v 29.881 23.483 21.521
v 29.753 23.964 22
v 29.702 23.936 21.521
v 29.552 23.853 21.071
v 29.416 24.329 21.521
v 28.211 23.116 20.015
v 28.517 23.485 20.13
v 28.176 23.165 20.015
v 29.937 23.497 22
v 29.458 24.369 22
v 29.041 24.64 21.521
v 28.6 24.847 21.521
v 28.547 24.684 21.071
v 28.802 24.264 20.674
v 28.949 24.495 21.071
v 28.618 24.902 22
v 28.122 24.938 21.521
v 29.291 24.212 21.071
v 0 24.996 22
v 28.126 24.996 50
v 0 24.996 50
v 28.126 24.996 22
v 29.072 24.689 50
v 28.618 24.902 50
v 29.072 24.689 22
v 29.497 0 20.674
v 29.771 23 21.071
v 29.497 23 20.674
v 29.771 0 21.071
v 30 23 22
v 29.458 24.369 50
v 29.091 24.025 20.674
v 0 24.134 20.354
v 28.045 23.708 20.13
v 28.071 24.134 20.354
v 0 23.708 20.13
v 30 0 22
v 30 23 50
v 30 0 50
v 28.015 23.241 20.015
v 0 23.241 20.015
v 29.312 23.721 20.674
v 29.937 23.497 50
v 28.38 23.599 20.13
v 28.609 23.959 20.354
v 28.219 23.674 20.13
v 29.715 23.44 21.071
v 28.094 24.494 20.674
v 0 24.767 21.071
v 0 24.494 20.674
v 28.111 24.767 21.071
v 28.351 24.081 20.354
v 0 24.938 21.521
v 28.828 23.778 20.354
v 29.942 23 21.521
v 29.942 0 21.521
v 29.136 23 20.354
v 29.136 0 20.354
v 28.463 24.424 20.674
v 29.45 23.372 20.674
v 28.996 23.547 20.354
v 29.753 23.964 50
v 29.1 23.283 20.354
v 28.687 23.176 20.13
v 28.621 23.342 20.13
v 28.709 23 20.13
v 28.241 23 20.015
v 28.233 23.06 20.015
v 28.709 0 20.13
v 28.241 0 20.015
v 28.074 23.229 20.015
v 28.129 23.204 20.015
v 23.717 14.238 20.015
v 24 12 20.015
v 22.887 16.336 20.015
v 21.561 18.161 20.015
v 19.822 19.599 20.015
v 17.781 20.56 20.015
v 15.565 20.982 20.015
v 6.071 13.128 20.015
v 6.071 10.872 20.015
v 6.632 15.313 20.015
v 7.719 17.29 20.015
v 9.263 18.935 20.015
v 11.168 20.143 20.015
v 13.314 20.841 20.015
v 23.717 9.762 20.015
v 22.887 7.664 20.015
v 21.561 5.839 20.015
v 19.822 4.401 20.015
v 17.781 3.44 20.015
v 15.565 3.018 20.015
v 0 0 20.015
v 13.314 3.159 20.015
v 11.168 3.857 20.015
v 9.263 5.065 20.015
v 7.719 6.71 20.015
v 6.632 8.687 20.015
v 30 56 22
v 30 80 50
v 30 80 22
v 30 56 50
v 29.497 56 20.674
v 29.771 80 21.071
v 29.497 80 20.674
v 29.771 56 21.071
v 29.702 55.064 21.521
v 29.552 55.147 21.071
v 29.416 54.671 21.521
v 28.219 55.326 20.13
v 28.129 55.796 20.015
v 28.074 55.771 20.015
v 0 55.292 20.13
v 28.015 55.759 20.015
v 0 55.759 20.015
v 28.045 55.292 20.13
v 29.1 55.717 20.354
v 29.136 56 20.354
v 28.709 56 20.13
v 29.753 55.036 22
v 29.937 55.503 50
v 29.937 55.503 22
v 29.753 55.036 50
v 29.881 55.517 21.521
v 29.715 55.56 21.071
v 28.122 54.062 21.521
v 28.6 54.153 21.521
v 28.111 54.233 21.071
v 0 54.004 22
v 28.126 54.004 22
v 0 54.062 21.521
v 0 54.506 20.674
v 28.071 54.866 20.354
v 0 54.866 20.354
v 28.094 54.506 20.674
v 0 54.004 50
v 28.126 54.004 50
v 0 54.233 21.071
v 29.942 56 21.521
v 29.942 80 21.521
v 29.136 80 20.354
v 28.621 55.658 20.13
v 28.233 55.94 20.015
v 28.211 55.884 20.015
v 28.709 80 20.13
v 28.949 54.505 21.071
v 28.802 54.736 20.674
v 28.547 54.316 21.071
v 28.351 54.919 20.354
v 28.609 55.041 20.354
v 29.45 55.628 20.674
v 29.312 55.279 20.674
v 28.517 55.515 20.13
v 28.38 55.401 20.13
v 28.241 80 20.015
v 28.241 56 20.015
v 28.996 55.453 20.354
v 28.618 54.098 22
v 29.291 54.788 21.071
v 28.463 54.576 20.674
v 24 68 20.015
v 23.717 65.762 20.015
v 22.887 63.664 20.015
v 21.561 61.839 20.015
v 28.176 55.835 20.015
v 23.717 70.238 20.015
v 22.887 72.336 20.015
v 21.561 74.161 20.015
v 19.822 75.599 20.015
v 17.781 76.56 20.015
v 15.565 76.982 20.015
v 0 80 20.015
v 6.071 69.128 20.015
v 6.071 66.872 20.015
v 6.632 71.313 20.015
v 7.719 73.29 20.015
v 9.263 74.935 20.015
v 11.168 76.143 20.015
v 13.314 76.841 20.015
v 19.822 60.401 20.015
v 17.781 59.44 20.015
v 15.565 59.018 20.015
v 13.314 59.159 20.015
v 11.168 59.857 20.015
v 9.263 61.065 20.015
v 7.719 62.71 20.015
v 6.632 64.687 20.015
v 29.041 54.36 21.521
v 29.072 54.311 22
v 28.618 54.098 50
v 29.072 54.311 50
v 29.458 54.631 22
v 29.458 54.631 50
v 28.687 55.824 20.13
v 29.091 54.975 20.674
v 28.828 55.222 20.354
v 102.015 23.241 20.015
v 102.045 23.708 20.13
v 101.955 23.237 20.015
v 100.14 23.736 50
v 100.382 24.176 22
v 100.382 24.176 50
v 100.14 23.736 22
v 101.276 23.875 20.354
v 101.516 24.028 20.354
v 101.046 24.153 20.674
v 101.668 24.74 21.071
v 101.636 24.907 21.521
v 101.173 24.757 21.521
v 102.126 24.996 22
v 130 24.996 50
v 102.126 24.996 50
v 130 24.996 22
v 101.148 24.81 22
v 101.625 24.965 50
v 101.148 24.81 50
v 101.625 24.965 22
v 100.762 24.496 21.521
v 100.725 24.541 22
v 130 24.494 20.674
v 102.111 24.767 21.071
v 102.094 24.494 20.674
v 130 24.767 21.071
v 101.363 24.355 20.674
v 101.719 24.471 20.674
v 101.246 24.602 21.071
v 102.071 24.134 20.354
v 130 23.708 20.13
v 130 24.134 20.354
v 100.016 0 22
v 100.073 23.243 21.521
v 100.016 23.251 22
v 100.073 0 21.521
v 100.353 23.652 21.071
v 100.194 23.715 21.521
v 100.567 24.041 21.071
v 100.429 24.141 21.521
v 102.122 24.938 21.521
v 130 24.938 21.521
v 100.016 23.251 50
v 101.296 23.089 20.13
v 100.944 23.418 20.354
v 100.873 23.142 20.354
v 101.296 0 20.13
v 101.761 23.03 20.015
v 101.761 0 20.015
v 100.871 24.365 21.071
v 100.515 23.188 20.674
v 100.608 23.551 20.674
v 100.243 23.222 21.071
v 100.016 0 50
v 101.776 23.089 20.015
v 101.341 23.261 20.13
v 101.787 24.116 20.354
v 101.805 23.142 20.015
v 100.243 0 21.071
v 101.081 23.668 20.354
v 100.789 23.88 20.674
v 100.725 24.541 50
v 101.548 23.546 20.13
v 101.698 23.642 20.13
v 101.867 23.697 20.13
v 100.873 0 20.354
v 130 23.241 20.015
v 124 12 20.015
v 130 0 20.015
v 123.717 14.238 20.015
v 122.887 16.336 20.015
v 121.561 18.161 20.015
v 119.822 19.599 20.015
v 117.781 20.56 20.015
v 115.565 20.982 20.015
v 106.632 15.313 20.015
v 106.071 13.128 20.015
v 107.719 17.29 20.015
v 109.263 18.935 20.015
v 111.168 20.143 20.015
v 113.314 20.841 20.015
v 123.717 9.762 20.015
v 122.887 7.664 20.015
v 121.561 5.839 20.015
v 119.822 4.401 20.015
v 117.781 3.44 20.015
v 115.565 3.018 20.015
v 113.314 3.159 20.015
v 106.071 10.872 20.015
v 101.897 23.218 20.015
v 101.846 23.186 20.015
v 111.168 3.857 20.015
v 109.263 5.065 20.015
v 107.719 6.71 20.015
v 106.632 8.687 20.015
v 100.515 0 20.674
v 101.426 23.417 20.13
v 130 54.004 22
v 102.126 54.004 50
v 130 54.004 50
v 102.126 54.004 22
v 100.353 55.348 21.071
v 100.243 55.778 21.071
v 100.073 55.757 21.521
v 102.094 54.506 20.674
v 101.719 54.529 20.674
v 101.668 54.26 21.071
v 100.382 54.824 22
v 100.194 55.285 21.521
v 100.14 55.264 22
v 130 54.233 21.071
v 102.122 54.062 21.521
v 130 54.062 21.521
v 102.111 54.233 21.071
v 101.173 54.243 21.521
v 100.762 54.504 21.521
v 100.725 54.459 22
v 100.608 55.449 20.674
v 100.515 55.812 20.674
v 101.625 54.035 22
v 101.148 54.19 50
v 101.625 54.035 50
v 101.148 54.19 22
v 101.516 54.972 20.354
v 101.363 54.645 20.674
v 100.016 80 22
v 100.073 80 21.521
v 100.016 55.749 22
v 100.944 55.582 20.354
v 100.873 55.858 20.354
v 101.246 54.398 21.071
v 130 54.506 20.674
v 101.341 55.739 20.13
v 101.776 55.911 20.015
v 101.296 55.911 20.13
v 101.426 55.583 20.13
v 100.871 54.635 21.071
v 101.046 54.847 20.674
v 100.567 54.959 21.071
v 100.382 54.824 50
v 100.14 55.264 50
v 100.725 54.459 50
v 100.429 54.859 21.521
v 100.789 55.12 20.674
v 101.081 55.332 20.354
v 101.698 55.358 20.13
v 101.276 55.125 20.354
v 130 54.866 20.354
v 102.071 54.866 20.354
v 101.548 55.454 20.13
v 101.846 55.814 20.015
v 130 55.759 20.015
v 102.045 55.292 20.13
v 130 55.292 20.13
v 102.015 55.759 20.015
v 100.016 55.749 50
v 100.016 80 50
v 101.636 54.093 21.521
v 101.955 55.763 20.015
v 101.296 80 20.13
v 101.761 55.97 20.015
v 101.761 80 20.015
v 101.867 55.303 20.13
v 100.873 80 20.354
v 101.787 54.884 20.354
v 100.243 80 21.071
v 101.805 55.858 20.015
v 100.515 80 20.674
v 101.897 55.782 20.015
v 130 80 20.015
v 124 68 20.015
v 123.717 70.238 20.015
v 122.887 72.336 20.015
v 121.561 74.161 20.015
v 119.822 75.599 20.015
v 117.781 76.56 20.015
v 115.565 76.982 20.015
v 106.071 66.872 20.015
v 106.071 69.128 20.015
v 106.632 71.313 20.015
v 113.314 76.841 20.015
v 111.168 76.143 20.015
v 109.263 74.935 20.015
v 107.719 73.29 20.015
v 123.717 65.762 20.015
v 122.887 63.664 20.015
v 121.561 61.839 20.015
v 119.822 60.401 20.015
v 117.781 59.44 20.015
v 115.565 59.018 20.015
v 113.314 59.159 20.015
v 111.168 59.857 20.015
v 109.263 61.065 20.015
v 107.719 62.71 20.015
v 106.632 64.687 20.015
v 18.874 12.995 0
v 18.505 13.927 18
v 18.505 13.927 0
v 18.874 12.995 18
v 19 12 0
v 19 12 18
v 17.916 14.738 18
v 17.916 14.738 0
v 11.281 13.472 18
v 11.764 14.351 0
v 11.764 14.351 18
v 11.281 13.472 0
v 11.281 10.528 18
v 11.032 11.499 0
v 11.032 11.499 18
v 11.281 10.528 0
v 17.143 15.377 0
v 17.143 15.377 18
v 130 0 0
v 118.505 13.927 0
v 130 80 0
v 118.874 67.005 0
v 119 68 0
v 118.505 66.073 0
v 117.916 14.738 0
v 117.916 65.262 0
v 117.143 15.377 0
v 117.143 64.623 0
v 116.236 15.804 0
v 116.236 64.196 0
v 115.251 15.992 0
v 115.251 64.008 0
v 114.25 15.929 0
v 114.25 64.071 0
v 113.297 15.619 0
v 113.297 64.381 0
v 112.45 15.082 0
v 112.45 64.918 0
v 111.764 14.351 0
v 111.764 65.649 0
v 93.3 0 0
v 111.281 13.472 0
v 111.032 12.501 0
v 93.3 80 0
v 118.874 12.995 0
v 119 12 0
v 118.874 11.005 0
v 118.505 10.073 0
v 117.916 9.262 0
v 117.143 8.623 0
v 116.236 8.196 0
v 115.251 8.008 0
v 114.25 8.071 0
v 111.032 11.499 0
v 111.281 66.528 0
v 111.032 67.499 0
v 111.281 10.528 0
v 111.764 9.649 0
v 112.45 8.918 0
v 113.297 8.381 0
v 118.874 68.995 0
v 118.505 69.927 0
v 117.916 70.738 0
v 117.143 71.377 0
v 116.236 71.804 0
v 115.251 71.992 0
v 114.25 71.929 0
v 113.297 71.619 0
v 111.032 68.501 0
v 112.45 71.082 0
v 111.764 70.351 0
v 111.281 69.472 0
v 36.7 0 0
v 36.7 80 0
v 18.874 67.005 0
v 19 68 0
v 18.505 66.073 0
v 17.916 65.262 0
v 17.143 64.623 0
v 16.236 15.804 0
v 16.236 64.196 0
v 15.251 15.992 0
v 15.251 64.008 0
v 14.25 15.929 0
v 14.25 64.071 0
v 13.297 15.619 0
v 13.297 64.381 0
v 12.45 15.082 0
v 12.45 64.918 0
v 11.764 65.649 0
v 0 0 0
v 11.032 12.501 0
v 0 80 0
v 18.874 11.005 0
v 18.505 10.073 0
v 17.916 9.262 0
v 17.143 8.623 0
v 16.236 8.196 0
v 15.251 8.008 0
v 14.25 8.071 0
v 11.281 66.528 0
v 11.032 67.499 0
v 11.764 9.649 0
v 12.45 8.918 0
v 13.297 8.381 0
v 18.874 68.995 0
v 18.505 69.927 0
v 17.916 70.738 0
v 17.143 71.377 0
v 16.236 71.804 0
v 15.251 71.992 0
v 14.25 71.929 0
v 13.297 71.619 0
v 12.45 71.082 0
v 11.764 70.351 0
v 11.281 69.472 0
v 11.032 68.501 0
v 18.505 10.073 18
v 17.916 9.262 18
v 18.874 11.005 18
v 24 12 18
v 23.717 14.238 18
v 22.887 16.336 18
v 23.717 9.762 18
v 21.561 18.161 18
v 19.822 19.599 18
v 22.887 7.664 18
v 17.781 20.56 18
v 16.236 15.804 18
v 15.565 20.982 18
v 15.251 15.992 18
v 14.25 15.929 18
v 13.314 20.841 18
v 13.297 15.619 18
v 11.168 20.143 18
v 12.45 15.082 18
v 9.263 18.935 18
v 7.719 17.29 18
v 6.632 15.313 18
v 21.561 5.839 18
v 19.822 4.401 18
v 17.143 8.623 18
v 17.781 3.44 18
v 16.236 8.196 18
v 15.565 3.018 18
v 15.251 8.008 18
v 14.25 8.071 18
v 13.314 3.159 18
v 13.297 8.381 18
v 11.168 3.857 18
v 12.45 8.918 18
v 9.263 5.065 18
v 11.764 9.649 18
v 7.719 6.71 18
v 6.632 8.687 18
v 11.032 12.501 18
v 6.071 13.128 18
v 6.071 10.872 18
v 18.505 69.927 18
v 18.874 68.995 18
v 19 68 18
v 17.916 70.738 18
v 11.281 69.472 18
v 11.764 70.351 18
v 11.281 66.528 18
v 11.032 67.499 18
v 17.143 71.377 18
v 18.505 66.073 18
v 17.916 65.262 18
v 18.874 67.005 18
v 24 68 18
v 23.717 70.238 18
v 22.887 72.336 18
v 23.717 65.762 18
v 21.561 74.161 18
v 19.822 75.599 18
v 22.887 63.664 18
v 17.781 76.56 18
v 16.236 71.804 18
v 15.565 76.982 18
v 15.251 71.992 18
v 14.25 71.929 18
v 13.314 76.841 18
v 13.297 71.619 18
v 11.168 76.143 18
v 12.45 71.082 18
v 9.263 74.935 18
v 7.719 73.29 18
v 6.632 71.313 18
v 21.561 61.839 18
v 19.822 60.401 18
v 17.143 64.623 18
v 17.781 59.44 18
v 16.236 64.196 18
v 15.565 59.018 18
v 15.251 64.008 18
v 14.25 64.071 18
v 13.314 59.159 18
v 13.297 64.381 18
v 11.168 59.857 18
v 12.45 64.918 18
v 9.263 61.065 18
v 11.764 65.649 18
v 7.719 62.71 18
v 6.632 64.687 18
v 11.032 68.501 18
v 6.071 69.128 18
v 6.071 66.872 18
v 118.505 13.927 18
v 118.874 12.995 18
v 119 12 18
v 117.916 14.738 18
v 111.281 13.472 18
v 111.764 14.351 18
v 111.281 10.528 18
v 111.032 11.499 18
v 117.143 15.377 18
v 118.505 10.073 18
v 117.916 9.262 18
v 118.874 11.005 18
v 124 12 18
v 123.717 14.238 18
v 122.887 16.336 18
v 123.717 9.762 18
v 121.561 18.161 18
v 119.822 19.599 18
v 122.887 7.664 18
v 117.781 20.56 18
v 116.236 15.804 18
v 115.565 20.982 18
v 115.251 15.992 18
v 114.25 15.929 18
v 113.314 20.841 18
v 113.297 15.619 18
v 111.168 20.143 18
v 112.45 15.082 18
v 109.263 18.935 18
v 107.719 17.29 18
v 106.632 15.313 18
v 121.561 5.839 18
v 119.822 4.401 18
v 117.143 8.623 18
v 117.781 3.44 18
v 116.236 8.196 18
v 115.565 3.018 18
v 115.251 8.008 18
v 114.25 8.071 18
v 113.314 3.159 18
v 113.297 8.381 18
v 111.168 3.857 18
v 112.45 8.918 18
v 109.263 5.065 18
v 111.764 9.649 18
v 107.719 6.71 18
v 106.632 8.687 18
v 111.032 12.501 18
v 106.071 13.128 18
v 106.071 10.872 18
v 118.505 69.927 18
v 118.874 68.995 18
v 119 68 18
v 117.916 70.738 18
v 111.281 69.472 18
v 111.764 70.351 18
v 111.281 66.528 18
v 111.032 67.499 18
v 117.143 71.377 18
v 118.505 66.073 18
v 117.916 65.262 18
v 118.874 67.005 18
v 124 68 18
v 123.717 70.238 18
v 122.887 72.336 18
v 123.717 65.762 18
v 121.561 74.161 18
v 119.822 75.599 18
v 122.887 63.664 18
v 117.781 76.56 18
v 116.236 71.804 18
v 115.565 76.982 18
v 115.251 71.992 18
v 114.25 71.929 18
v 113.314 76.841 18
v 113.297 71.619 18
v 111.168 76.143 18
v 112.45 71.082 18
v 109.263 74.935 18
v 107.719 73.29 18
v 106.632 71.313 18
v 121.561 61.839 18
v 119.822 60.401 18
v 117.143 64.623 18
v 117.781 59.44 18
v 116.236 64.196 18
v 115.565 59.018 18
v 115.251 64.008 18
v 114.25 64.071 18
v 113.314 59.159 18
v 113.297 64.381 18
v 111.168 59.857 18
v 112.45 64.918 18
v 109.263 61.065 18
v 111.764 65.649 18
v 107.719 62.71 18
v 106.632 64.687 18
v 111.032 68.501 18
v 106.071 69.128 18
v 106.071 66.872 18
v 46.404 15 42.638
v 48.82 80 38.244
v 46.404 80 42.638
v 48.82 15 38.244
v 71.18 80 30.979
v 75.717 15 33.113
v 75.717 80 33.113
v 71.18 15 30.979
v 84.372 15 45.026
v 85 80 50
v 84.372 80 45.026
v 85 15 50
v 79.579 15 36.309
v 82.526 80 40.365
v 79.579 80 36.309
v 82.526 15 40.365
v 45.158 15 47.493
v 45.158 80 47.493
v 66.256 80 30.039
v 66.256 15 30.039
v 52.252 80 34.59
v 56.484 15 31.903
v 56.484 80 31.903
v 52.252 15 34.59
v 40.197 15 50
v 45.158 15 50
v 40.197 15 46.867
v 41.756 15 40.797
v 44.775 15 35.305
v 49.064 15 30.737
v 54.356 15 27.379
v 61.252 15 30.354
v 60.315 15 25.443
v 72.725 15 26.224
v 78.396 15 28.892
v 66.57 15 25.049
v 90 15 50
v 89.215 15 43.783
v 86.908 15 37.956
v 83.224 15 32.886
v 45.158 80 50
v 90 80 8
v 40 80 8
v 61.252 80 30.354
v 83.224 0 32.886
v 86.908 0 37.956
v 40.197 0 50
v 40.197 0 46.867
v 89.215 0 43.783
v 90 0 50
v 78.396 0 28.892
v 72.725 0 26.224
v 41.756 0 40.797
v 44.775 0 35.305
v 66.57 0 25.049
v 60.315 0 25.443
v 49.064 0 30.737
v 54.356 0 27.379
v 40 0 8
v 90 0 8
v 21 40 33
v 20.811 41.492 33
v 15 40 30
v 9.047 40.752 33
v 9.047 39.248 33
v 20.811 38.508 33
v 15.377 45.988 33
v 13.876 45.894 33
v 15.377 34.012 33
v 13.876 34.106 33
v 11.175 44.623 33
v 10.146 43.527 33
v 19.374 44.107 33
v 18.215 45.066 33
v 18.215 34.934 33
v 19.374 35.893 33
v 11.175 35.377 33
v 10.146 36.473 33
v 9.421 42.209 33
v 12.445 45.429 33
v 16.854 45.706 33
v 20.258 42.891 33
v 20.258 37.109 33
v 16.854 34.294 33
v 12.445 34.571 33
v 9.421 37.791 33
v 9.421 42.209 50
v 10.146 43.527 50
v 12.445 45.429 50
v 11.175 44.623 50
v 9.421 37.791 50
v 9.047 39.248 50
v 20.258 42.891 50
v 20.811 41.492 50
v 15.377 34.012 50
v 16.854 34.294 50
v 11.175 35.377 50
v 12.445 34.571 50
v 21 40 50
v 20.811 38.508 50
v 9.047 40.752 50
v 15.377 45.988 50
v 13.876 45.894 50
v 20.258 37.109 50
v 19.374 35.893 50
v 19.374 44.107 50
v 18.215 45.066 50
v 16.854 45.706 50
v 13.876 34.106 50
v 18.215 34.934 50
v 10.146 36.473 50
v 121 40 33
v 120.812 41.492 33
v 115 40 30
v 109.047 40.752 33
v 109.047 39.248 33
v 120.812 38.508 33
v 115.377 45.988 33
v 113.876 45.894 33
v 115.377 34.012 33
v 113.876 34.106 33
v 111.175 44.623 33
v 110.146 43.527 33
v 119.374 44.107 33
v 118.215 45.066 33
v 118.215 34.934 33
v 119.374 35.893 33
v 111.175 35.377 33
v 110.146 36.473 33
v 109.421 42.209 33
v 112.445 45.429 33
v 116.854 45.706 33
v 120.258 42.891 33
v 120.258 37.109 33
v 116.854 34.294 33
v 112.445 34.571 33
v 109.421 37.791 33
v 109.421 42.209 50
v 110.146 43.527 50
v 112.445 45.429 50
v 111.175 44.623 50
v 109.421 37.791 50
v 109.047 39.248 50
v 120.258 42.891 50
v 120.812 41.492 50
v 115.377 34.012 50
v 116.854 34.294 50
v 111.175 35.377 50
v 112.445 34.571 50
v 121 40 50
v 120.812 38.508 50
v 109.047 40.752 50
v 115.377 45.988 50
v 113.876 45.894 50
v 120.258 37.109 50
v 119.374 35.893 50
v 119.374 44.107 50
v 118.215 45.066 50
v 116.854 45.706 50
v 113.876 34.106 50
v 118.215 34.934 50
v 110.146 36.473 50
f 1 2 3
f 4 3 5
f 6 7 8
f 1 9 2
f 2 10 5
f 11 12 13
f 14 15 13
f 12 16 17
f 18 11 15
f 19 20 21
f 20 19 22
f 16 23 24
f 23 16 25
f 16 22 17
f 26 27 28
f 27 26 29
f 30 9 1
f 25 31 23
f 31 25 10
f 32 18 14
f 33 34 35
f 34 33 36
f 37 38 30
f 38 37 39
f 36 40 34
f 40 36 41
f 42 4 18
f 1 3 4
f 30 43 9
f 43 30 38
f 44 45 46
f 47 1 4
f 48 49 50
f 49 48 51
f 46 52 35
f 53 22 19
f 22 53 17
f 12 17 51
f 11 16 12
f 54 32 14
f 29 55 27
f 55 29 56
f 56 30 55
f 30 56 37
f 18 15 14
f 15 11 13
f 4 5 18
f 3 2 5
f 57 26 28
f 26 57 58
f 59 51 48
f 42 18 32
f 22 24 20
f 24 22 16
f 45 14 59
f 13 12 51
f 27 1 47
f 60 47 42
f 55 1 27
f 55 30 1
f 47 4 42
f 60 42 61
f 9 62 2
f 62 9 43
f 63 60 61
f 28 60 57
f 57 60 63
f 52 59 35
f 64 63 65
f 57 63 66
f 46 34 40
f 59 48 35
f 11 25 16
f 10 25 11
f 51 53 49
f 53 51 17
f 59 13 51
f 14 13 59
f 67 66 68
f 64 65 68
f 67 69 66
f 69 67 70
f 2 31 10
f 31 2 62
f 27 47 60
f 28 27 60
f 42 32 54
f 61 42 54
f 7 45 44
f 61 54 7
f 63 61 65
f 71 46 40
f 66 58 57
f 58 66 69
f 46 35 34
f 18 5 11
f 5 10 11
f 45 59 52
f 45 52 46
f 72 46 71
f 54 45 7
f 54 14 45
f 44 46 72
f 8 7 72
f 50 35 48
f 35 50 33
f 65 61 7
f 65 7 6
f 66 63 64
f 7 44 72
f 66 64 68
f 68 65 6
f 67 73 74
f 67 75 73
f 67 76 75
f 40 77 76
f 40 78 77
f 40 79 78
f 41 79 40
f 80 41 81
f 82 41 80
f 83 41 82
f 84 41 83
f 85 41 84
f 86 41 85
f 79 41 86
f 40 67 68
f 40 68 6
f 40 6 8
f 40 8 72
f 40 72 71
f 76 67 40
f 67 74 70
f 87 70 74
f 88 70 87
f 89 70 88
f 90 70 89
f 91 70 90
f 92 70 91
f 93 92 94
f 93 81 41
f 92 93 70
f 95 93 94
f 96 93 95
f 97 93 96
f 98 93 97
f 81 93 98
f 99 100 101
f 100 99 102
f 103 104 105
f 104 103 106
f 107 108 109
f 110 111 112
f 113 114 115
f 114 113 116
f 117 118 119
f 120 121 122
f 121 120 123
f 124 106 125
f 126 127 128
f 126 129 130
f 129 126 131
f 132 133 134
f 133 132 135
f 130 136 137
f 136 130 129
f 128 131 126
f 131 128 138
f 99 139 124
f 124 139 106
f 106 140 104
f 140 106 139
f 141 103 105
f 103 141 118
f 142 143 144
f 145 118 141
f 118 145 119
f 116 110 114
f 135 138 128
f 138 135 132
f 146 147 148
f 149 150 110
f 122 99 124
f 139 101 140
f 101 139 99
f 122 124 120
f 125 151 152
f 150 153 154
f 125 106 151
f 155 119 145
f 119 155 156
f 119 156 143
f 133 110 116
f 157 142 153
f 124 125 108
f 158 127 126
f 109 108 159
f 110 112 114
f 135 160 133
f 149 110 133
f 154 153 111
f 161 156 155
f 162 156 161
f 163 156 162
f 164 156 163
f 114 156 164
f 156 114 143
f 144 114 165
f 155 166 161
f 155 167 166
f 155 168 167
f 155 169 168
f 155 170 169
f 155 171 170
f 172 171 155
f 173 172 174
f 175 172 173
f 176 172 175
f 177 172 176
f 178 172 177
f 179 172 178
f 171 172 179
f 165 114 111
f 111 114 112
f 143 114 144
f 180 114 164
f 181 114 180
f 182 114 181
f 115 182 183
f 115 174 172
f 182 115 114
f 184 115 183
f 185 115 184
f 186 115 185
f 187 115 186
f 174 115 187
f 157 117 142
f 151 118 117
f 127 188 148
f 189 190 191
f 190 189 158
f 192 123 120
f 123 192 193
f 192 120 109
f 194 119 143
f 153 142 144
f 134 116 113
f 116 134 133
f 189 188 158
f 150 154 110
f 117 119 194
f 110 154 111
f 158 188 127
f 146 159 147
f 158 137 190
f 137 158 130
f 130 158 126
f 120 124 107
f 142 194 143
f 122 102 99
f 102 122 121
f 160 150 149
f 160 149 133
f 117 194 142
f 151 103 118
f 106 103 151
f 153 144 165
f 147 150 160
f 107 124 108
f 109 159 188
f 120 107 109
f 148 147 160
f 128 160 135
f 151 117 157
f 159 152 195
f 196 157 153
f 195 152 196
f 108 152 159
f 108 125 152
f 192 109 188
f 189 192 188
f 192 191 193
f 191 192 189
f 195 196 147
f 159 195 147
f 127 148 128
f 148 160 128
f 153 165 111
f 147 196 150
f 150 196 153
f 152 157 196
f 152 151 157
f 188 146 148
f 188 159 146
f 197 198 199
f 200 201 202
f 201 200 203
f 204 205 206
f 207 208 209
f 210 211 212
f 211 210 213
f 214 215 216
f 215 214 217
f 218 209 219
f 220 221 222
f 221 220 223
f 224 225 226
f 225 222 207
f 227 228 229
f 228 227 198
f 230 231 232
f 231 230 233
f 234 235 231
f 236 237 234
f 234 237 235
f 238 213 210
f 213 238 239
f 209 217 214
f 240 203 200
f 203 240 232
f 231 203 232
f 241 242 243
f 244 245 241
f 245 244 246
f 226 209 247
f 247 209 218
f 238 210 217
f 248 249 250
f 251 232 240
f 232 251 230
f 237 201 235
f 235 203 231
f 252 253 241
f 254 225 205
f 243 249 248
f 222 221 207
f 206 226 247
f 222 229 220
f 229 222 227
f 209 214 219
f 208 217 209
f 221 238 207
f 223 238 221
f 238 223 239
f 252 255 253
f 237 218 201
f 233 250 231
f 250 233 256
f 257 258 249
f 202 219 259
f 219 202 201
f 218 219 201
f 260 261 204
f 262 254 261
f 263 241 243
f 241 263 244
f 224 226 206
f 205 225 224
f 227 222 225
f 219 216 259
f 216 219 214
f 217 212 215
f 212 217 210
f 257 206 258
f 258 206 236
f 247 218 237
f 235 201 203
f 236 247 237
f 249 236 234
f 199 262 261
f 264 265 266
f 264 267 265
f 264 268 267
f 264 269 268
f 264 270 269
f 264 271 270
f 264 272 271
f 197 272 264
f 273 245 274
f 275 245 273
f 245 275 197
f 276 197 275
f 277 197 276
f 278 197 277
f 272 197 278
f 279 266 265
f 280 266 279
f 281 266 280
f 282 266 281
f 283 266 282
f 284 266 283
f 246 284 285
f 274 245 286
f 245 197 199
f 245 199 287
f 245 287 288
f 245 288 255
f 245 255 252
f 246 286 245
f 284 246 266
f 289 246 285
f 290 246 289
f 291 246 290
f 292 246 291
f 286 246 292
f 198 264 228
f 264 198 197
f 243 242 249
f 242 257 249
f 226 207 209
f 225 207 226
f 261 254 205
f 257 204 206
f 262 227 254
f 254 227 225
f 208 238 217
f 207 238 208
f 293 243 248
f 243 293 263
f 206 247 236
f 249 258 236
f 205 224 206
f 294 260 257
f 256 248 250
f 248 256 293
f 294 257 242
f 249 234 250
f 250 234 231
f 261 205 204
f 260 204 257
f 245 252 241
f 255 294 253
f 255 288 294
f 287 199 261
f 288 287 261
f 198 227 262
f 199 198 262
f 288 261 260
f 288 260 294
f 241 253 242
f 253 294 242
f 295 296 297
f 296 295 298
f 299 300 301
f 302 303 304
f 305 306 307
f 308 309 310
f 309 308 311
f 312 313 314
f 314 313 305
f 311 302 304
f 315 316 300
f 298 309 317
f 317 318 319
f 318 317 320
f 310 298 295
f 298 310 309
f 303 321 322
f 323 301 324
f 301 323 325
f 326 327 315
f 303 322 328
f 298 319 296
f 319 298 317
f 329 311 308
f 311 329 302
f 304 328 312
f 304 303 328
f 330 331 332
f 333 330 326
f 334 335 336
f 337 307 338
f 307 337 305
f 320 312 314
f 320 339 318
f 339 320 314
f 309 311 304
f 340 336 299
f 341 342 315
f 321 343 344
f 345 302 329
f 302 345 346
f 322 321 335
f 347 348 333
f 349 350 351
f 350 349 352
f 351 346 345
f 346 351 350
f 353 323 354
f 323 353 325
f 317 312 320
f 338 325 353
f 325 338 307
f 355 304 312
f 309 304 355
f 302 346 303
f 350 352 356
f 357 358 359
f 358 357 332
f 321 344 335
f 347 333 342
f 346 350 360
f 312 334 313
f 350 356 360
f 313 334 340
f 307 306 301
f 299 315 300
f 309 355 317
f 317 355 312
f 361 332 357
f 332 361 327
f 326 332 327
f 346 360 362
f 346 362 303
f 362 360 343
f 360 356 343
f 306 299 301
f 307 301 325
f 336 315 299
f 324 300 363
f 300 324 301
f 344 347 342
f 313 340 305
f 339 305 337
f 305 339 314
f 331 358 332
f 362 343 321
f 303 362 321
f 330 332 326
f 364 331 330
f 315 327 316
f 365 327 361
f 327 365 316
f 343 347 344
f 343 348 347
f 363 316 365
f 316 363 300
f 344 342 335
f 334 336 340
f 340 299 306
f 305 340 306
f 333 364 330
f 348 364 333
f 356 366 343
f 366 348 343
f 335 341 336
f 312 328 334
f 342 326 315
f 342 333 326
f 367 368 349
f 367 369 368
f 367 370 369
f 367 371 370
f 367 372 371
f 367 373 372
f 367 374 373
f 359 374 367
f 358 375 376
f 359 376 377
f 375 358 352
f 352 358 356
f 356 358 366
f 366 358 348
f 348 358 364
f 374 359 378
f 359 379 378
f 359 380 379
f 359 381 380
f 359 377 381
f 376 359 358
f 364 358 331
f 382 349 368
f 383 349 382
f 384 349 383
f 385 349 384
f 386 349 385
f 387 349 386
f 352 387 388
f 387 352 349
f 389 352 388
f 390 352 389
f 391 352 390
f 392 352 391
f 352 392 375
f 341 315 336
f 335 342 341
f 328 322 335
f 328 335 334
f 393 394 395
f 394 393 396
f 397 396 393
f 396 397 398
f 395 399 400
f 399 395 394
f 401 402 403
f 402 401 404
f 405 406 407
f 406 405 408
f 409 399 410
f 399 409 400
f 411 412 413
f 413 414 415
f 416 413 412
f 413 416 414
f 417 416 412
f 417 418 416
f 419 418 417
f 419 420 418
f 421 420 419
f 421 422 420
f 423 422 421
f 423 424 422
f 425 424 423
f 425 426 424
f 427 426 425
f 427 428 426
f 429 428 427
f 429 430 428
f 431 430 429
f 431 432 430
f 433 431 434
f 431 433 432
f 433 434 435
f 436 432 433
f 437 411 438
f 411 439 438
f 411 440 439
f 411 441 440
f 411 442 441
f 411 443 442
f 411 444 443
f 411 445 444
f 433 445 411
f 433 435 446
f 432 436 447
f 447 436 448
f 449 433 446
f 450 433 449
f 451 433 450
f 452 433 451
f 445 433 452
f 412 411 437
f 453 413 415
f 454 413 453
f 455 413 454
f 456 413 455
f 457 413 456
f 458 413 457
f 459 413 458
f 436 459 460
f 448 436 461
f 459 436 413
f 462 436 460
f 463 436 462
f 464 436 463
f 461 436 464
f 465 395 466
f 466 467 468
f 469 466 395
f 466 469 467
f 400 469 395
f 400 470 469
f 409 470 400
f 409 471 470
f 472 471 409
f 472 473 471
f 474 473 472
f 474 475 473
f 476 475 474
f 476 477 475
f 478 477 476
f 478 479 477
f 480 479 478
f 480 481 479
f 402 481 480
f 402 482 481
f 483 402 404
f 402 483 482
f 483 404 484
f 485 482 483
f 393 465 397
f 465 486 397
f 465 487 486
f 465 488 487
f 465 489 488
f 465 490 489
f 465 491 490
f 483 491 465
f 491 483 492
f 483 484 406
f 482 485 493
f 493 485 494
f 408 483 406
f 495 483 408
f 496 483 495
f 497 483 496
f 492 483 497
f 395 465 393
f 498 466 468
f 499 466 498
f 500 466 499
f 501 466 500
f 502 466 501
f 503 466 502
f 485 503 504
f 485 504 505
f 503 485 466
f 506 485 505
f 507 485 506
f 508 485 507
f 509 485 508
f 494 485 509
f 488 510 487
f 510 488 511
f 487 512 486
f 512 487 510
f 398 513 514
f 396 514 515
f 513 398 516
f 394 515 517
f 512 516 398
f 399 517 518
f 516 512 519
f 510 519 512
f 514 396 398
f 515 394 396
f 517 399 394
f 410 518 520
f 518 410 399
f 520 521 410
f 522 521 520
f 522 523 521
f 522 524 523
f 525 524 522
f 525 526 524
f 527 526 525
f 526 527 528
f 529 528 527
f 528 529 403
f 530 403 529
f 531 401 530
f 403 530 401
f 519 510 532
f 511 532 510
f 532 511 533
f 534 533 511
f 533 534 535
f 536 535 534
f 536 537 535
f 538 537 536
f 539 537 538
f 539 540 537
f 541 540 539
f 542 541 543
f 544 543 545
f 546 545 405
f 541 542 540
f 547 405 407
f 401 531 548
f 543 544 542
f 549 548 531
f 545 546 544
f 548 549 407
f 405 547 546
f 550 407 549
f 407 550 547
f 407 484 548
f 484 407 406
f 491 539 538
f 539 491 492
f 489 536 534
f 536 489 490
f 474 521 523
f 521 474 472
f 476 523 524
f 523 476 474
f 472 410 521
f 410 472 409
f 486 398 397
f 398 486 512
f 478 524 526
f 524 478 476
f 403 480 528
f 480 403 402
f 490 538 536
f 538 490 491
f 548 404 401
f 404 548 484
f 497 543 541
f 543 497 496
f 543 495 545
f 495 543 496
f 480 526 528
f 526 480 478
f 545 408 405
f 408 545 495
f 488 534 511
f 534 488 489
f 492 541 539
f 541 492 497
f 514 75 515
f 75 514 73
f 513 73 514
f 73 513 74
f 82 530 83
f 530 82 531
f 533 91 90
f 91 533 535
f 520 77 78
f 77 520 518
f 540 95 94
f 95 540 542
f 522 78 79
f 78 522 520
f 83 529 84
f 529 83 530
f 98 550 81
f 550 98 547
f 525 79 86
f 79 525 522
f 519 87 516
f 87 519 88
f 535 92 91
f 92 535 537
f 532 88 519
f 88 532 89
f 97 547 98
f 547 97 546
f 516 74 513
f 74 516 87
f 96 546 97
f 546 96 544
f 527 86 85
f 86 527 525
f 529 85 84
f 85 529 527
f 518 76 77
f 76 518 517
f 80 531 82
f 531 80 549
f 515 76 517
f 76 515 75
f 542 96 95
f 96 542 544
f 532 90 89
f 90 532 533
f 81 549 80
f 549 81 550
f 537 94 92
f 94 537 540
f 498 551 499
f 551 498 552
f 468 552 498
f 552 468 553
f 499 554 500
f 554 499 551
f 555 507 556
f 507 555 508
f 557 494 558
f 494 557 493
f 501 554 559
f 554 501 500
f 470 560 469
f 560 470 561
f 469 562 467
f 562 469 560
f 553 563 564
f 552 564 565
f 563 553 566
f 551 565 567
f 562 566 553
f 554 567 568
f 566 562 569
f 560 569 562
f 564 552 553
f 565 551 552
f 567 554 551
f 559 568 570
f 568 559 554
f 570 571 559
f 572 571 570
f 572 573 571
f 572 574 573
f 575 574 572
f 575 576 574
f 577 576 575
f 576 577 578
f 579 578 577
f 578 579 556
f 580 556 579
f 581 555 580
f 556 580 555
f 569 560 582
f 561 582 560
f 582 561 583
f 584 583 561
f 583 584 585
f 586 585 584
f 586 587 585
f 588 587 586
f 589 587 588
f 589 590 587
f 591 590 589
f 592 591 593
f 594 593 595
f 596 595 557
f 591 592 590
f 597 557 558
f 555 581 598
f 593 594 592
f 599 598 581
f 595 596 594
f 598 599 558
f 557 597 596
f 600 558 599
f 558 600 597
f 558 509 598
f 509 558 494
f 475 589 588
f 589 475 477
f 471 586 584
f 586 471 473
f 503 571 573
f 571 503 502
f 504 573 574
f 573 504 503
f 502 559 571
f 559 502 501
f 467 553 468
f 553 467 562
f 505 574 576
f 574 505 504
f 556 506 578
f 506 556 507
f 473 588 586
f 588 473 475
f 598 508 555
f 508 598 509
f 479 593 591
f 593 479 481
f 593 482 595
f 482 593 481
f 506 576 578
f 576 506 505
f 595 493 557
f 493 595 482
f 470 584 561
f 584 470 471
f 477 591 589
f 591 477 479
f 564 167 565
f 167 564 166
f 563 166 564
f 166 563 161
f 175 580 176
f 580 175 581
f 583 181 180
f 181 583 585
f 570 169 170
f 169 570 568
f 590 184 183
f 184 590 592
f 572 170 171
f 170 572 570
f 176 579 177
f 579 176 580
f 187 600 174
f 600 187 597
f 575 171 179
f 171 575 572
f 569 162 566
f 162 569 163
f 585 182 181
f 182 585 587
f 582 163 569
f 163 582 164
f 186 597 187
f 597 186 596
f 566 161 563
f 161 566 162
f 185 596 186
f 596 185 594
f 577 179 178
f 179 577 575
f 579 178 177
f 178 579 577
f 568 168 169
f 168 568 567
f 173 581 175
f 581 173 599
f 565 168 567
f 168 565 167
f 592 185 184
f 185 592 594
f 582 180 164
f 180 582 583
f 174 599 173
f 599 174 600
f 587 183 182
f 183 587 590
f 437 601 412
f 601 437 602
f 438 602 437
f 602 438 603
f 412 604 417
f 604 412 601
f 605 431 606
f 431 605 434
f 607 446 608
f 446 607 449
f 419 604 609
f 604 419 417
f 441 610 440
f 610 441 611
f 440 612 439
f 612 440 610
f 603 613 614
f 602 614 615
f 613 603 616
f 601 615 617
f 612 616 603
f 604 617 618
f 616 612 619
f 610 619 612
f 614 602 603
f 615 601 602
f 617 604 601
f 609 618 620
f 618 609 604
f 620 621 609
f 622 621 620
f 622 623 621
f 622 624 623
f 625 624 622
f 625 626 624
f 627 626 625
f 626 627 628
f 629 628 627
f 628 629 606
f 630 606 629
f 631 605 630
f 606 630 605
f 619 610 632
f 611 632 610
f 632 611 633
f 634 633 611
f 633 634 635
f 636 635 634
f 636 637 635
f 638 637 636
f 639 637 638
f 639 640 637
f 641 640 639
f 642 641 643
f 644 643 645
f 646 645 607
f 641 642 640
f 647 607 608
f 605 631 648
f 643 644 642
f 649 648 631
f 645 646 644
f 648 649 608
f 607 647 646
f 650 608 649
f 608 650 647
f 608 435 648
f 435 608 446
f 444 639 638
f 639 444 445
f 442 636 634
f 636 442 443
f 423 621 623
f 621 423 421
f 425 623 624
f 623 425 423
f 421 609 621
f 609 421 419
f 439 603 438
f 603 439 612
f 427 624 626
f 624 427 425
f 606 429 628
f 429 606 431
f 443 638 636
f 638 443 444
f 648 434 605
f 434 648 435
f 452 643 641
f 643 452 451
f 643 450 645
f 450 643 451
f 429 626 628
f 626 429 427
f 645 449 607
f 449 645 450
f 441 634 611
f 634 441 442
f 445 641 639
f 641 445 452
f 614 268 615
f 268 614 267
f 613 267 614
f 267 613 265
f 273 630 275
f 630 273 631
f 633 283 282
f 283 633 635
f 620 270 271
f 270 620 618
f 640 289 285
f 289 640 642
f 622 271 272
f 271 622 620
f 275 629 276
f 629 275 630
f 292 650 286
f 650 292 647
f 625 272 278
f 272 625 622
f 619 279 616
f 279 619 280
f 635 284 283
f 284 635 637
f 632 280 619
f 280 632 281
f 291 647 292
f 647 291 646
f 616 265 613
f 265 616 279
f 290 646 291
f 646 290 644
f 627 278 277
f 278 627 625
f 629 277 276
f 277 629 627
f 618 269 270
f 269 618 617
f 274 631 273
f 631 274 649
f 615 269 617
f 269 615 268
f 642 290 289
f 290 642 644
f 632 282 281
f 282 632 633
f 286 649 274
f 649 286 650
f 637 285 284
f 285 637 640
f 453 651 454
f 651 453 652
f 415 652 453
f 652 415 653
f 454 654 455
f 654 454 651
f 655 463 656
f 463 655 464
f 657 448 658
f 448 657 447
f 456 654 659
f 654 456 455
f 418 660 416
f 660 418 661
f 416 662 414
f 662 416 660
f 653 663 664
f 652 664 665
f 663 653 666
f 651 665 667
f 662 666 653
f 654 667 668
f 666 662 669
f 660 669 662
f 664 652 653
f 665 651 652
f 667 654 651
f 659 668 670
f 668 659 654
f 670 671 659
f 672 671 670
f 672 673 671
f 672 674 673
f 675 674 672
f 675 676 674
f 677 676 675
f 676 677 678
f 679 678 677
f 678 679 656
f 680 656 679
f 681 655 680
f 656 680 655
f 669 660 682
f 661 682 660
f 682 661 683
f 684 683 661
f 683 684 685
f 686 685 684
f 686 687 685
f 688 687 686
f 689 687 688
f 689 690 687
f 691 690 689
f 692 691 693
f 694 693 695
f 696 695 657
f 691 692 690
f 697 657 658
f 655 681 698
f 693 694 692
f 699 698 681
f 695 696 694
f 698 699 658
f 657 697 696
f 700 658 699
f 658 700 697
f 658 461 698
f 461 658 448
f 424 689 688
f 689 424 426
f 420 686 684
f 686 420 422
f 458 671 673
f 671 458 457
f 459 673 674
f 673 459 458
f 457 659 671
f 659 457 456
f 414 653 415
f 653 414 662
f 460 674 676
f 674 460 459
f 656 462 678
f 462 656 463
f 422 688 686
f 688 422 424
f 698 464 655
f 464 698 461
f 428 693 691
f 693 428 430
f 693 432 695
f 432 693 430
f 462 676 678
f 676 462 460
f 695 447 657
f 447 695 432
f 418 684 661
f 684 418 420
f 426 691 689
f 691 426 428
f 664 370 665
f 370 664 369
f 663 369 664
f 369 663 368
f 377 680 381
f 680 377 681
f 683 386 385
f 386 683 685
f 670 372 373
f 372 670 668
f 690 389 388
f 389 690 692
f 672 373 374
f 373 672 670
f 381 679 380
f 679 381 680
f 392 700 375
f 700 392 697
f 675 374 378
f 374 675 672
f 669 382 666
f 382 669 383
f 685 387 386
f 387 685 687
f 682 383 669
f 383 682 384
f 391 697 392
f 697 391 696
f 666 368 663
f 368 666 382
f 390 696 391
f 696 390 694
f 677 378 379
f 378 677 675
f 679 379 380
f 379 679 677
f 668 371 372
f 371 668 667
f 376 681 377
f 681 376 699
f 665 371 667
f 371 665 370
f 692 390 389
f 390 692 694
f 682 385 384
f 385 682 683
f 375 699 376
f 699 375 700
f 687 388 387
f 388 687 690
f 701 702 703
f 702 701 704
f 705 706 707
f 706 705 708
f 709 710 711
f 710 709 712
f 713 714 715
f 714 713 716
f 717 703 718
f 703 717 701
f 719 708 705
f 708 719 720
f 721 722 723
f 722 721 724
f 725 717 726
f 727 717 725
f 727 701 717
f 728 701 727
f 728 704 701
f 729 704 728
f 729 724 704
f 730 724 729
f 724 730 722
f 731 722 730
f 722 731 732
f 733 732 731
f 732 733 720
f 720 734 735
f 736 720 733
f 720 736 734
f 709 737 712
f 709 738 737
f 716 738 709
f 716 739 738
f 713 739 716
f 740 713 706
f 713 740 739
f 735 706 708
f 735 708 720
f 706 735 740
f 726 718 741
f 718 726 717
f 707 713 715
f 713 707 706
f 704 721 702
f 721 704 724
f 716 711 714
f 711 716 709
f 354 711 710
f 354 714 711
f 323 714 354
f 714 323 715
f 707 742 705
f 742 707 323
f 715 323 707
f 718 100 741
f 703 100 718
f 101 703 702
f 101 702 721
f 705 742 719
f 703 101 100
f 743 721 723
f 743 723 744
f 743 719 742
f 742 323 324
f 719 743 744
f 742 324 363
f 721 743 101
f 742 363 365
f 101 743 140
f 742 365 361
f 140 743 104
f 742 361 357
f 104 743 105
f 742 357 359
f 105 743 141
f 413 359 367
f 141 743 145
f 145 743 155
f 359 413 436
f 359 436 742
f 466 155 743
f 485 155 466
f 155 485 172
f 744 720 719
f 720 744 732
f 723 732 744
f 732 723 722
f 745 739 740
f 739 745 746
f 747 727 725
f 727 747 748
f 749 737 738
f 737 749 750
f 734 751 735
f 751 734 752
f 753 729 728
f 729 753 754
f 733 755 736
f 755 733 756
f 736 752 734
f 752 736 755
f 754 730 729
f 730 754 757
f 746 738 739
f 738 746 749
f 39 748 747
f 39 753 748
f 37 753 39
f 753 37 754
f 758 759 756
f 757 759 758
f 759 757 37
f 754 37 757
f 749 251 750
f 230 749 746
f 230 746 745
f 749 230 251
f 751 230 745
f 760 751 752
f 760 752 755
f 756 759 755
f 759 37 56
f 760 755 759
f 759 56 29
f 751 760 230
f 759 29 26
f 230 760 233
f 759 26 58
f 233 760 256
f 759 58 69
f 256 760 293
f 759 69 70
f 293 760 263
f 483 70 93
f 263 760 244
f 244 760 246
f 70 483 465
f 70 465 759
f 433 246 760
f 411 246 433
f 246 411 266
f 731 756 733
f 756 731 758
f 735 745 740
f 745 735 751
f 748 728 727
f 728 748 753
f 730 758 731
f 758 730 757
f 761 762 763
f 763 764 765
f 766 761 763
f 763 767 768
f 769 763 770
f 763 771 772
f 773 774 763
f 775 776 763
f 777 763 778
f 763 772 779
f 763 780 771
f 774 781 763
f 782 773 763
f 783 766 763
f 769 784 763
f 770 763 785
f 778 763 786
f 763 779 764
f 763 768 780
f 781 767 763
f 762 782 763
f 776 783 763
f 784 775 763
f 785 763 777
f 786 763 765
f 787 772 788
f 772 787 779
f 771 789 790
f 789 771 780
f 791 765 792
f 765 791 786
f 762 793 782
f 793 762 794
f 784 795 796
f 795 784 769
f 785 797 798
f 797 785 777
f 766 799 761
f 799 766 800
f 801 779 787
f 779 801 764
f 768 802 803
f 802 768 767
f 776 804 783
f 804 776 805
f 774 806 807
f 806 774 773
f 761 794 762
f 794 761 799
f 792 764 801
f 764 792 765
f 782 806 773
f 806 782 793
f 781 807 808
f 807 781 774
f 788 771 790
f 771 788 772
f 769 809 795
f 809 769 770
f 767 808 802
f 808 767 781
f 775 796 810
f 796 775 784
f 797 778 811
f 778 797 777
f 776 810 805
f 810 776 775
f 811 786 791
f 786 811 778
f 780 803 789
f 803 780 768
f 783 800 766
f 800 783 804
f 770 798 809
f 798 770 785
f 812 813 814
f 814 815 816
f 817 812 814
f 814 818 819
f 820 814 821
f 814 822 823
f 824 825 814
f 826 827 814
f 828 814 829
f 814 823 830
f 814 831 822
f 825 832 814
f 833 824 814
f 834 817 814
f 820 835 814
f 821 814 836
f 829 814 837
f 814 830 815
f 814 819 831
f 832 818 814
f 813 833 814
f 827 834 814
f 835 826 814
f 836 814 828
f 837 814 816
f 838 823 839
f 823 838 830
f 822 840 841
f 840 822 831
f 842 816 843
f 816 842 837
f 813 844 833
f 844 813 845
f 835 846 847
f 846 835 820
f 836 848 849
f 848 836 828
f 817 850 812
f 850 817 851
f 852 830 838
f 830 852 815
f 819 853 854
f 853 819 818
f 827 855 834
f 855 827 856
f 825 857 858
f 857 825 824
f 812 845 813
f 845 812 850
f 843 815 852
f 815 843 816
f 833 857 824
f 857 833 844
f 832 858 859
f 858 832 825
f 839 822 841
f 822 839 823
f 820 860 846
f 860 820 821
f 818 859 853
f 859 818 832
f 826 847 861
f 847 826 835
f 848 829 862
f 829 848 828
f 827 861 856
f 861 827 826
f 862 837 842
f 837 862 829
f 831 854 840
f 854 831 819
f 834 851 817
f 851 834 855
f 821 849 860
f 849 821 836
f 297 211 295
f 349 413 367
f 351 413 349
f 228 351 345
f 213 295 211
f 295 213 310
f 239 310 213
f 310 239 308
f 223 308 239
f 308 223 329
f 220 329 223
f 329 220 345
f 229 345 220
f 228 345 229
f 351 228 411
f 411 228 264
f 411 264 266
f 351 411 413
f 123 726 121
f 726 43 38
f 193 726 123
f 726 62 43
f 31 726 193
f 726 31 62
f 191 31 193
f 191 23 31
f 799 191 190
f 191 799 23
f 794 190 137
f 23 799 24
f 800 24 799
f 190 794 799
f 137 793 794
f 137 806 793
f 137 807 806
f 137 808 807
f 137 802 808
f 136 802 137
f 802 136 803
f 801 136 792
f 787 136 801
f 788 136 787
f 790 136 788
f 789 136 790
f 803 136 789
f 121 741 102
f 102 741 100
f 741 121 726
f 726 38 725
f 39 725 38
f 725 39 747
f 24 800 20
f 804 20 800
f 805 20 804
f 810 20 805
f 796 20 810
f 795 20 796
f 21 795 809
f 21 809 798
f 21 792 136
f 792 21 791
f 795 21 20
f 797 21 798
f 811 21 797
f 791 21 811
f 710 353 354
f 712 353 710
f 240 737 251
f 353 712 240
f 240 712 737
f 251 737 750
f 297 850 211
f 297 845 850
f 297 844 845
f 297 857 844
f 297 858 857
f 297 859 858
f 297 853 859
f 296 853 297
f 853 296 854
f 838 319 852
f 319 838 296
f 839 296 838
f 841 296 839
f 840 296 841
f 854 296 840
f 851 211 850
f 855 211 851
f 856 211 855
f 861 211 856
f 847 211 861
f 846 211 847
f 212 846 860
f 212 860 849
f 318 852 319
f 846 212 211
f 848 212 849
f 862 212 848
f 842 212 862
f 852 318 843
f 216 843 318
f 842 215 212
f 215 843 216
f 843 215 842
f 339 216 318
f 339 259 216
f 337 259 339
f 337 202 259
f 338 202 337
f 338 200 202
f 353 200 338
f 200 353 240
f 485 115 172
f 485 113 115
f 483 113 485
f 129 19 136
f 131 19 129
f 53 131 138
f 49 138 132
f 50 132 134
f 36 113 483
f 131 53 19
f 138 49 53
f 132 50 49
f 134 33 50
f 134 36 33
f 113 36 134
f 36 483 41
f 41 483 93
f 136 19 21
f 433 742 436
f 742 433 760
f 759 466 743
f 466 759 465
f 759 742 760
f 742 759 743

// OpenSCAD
$fn = 25;

difference() {
    cube([130, 80, 50]);
    
    for (x = [0:104:104]) {
        for (y = [0:58:58]) {
            translate([x, y, 0]) {
                translate([-2, -2, 22])
                minkowski() {
                    cube([30, 25, 30]);
                    sphere(d=4);
                }
            }
        }
    }
    
    for (x = [0:100:100]) {
        for (y = [0:56:56]) {
            translate([x, y, 0])
            translate([15, 12, 0]) {
                cylinder(18, d = 8, false);
                translate([0, 0, 18])
                cylinder(3, d = 18, false);
            }
        }
    }
    
    translate([65, 80, 50])
    rotate([90, 0, 0]) {
        cylinder(65, d = 40, false);
        translate([0, 0, 65])
        cylinder(15, d = 50, false);
    }
    
    for (x = [0:100:100]) {
        translate([x, 0, 0]) {
            translate([15, 40, 30]) {
                cylinder(h = 3, r1 = 0, r2 = 6, center = false);
                
                translate([0, 0, 3])
                cylinder(20, d = 12, false);
            }
        }
    }
    
    translate([0, 80, 0])
    rotate([90, 0, 0])
    linear_extrude(height = 80, center=false)
    polygon([[36.7, 0], [93.3, 0], [90, 8], [40, 8]]);
}
